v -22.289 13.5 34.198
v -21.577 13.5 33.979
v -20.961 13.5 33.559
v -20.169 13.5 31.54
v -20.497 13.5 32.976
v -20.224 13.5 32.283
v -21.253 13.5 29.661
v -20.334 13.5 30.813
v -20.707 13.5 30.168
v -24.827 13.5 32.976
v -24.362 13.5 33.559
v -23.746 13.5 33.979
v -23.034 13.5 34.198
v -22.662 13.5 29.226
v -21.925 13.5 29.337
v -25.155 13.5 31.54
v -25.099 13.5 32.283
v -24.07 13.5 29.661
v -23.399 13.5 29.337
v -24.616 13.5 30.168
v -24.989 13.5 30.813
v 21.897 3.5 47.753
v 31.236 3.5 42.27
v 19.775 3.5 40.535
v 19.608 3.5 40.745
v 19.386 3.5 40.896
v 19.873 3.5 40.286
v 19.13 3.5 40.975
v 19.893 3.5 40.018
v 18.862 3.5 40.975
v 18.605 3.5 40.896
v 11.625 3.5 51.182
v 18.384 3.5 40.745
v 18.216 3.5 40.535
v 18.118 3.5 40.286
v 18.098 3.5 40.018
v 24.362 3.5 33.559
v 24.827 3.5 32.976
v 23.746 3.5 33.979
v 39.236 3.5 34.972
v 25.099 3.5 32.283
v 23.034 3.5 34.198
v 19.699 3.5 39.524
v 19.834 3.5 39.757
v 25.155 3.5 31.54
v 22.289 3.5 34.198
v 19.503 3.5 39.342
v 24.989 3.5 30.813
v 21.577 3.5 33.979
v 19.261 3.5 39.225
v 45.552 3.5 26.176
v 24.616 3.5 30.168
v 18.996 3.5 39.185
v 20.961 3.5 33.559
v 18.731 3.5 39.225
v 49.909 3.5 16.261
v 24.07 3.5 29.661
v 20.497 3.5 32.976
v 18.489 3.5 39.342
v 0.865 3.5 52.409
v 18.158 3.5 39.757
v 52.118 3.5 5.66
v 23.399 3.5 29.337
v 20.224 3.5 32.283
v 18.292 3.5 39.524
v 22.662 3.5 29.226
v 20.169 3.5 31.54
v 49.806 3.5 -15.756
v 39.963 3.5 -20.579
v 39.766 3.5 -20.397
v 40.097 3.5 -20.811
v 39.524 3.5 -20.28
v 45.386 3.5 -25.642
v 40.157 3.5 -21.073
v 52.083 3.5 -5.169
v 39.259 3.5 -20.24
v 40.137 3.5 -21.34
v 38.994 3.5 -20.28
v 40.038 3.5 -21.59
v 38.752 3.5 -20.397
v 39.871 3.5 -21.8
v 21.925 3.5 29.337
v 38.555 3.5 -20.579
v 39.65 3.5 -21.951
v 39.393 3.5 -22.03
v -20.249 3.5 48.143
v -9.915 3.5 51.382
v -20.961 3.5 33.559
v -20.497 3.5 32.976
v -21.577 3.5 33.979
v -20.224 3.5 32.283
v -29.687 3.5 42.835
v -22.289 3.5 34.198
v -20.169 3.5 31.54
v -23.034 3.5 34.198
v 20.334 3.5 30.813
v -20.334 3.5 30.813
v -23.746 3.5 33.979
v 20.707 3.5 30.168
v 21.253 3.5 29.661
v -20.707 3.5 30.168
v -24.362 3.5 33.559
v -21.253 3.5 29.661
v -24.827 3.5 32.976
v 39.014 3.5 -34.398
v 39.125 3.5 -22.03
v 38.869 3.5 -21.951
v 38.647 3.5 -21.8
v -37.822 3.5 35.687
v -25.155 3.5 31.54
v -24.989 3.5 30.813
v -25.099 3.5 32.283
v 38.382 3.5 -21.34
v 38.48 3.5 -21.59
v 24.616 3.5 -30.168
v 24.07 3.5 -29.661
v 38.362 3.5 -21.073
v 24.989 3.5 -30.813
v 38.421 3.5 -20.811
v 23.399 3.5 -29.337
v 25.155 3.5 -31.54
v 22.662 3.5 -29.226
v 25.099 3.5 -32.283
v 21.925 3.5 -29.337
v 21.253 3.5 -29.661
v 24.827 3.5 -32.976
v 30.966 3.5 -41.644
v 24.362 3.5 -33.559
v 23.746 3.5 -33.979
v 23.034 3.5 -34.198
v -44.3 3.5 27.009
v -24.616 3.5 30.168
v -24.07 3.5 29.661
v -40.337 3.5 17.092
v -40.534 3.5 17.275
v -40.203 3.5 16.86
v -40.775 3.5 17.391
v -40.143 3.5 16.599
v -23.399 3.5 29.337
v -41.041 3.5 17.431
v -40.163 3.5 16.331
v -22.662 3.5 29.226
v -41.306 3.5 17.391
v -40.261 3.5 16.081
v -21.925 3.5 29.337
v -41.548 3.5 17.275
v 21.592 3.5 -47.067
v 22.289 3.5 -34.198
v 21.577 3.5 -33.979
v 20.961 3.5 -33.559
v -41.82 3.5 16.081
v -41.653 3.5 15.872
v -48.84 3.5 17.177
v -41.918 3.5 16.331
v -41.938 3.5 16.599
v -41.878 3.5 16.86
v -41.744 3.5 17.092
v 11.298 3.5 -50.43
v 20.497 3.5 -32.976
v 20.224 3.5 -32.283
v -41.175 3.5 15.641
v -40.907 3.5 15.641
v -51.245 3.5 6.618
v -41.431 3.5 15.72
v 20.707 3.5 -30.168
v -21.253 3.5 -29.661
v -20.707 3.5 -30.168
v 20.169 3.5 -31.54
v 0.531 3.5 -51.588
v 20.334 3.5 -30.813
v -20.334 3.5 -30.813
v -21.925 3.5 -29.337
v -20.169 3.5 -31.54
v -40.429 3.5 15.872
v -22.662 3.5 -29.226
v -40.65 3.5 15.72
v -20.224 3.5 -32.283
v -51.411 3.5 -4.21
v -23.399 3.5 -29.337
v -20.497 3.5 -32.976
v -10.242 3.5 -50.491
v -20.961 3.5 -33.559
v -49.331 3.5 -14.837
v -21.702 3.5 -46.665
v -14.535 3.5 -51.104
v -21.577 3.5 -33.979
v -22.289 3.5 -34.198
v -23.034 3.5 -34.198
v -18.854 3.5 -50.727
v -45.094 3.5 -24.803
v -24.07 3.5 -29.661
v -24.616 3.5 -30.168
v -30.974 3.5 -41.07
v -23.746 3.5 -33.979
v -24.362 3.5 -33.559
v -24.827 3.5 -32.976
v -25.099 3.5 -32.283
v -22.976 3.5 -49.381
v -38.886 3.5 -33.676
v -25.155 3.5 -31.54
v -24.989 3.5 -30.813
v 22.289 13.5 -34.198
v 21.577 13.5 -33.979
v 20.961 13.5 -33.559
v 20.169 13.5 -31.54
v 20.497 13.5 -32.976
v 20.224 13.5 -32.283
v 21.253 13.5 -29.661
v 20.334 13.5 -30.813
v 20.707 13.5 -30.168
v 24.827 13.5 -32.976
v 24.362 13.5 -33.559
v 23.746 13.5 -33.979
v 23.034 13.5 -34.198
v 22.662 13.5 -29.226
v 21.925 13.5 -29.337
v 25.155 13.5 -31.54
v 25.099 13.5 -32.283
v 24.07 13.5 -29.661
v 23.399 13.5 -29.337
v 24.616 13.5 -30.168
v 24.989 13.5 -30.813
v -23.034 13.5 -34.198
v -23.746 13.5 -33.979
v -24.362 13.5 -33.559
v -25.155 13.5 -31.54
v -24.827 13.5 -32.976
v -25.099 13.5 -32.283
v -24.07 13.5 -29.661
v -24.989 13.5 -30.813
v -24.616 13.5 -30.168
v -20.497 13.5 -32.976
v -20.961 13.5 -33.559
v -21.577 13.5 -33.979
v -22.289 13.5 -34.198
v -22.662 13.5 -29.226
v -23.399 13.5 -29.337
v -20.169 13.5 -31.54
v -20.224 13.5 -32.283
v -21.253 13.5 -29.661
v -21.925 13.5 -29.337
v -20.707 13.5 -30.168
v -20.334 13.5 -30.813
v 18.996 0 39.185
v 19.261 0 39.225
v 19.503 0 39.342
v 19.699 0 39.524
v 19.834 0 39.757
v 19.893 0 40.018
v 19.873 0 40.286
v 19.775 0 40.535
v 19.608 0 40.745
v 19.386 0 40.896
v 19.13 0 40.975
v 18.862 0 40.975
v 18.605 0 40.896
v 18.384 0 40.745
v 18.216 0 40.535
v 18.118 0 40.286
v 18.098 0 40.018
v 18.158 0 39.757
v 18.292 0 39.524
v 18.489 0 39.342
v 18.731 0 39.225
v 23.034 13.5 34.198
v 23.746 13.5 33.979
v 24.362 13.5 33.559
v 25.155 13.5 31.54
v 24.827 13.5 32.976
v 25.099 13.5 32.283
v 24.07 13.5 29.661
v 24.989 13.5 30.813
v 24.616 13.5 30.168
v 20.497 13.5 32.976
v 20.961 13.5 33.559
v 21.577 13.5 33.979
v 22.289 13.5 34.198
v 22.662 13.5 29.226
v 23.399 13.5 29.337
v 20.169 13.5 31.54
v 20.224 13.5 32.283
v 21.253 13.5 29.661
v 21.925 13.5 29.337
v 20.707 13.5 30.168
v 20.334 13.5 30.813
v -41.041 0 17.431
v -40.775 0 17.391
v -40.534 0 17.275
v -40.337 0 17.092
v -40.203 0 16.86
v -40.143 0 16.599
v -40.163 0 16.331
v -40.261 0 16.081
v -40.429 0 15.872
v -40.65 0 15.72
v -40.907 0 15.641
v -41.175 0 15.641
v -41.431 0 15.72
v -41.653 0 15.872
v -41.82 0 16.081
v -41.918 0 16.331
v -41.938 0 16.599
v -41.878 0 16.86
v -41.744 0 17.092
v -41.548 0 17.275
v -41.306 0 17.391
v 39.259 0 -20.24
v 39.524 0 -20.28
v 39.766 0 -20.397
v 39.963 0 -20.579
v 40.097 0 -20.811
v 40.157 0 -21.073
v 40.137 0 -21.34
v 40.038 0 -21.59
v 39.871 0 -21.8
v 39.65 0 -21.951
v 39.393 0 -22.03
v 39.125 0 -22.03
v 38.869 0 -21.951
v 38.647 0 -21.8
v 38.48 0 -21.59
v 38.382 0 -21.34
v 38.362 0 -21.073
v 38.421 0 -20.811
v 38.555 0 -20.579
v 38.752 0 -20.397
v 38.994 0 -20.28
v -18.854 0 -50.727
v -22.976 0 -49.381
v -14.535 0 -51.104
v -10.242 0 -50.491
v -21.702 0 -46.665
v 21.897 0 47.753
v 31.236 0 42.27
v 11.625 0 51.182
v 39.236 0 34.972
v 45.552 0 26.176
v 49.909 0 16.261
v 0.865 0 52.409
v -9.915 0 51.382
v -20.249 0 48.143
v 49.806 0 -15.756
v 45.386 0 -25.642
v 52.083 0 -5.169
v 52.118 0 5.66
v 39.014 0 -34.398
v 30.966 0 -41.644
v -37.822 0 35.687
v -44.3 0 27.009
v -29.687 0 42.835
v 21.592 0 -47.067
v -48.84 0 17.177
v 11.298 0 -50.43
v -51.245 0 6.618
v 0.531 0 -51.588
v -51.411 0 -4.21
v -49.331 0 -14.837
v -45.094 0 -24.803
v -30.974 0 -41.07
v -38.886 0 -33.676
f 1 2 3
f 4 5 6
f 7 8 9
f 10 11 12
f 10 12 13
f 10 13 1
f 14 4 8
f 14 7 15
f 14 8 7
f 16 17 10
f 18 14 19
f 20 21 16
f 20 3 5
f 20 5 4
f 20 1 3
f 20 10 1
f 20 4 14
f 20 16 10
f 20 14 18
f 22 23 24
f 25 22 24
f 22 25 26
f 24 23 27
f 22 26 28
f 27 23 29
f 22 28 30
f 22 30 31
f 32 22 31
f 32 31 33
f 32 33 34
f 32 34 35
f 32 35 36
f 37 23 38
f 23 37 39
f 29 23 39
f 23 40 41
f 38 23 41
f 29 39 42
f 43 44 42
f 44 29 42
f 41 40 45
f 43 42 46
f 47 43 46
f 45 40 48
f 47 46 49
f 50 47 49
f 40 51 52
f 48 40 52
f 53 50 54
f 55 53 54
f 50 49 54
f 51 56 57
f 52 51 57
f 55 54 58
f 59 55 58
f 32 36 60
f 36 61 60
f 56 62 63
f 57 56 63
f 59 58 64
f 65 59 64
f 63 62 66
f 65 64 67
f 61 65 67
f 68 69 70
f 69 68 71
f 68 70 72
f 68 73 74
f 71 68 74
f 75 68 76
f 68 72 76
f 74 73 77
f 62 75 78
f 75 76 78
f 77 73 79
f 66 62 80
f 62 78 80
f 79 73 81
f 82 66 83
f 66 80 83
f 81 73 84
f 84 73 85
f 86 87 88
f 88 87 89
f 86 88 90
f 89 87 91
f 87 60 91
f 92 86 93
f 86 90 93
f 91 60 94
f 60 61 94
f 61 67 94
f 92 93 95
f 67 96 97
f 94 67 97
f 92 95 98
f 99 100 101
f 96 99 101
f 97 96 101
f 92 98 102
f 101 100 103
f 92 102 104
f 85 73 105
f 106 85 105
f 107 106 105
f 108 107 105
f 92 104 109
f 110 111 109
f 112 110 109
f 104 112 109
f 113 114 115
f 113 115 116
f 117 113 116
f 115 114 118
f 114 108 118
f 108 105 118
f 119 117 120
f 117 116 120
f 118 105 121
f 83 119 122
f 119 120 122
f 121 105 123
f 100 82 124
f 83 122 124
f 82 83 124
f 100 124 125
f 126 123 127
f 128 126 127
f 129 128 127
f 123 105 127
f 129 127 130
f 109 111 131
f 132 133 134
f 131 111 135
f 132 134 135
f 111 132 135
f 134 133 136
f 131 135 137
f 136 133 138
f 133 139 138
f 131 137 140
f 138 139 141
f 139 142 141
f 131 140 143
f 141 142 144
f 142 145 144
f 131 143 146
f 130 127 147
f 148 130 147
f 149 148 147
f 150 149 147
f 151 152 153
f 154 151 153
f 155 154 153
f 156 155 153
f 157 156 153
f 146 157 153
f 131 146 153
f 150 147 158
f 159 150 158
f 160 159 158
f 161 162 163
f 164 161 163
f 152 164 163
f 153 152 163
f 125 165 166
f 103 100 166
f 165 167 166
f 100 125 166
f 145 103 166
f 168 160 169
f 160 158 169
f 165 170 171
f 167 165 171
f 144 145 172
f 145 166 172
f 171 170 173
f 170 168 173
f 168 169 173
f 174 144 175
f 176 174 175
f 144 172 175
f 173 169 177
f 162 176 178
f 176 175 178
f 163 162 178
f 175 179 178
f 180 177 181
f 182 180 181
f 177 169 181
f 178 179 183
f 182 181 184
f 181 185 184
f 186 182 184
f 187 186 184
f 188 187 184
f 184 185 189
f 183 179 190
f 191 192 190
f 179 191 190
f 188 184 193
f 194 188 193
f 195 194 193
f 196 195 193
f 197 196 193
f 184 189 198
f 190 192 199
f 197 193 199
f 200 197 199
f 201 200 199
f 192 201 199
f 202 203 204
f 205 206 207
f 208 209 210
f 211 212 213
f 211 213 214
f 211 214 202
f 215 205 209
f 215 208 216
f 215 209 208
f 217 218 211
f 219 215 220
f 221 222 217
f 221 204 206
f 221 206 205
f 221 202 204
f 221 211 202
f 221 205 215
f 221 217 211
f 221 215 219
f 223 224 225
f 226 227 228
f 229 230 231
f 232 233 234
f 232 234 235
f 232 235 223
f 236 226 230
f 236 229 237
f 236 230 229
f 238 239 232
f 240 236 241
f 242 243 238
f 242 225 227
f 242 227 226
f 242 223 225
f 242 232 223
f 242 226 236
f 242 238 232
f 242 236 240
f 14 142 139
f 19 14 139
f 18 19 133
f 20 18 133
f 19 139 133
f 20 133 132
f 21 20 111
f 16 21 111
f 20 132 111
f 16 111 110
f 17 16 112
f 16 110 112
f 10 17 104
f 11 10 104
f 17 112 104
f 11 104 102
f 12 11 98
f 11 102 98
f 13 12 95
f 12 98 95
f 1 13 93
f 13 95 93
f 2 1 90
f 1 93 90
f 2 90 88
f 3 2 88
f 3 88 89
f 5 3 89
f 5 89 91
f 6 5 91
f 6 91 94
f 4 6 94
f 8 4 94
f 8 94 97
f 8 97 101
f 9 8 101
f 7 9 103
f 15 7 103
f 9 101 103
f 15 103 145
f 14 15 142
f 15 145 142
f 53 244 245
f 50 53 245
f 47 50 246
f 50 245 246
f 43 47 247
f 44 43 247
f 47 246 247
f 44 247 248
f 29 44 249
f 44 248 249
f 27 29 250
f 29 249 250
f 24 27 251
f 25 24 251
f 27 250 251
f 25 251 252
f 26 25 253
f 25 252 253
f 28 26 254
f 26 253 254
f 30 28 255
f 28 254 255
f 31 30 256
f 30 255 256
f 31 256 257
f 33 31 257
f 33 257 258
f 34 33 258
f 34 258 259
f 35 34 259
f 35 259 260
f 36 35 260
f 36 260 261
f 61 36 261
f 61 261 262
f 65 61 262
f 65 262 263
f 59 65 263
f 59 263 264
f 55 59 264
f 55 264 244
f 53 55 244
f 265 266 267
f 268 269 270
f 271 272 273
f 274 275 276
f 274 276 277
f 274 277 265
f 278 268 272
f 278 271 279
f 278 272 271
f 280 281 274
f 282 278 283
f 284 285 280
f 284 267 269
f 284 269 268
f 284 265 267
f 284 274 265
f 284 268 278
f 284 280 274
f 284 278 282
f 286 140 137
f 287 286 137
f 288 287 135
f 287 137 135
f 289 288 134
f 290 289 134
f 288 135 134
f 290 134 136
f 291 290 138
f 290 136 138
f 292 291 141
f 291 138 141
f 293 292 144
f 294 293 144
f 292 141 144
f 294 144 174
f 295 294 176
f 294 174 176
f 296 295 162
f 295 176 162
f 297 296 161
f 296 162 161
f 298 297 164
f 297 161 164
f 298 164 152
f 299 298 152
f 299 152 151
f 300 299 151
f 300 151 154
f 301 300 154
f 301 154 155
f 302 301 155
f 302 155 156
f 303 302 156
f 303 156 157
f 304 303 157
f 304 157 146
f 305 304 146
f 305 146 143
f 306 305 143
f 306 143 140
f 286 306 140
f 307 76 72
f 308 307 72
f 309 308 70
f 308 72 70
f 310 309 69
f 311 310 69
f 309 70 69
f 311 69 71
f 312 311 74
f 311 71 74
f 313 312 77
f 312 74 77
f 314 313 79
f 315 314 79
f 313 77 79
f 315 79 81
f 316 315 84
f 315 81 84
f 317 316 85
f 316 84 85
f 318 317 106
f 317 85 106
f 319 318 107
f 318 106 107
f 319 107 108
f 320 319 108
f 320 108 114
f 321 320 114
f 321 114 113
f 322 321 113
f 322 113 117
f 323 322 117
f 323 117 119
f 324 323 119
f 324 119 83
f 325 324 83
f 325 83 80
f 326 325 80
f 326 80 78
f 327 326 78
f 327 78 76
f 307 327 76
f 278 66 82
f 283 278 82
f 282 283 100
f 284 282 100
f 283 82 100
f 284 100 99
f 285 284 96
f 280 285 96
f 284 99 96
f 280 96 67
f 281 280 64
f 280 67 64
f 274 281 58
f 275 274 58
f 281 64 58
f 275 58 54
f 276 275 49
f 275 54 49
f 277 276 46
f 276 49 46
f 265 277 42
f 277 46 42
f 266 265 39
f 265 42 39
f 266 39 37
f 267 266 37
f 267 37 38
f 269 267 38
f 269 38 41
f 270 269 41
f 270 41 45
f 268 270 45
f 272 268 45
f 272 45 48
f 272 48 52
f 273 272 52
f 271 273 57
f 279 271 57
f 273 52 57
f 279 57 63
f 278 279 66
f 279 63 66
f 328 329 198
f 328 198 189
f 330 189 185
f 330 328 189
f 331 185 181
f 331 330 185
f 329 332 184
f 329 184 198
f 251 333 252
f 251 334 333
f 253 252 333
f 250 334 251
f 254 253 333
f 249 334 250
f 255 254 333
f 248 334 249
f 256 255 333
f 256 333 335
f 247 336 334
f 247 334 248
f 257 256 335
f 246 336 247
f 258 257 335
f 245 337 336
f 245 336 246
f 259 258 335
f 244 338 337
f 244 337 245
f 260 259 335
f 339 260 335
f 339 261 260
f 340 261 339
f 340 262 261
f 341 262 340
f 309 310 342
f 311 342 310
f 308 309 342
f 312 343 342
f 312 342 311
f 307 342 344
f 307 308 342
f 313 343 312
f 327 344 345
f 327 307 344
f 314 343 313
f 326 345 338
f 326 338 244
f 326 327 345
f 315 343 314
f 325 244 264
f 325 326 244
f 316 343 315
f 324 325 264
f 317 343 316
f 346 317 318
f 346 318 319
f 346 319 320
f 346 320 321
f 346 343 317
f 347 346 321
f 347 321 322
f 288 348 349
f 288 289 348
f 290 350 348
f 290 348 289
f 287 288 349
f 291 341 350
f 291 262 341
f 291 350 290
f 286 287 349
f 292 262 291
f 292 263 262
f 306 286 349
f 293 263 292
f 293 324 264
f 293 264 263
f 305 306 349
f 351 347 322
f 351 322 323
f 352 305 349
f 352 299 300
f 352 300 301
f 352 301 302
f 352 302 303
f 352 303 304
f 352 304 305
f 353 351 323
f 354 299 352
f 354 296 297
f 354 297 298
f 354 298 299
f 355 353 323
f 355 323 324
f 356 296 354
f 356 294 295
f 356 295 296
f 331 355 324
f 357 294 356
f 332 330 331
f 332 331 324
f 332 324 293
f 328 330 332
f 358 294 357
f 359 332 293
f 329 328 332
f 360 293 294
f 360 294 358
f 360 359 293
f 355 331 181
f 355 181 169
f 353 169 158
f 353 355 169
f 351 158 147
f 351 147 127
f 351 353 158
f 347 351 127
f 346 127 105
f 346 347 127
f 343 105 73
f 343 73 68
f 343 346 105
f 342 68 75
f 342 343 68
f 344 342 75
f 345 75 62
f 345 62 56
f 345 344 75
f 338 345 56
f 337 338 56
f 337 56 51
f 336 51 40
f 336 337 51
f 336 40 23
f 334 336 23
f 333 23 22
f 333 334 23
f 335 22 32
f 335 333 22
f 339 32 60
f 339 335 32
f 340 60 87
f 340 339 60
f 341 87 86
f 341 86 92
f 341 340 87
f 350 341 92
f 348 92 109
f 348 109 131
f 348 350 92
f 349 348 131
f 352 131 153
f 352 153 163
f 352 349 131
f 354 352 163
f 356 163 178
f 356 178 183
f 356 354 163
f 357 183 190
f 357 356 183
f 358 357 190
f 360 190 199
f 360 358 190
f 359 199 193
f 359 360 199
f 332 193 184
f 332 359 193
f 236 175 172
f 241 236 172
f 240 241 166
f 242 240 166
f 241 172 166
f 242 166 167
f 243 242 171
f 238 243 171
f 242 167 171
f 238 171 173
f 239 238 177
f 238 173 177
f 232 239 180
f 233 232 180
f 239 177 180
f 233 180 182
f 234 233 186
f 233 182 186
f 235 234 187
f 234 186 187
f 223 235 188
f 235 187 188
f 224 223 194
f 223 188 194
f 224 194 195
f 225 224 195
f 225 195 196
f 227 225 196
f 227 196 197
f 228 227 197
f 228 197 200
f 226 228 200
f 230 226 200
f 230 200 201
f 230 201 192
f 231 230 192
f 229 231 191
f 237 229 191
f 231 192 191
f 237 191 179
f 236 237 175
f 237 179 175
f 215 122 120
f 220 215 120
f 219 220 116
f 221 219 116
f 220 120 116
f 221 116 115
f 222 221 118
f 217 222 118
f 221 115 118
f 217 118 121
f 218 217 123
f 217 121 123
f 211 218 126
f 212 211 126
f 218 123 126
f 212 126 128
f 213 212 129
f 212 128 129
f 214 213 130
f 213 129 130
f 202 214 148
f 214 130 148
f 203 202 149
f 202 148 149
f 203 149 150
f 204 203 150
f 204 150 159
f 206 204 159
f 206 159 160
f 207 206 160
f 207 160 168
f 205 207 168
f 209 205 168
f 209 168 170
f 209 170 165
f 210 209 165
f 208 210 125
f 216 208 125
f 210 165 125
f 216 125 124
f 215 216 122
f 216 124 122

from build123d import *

# Parameters (mm, degrees)
BOSS_EXTRUDE1_DEPTH = 3.5
SKETCH2_R           = 0.9
CUT_EXTRUDE1_DEPTH  = 75.183799012
SKETCH3_R           = 2.5
BOSS_EXTRUDE2_DEPTH = 10
SKETCH4_R           = 0.9
CUT_EXTRUDE2_DEPTH  = 10


with BuildPart() as part:
    # Sketch1 → Boss-Extrude1 (new body)
    with BuildSketch(Plane(origin=(0, 0, 0), x_dir=(1, 0, 0), z_dir=(0, 1, 0))):
        with BuildLine():
            Line((-21.702078291, 46.665350003), (-22.976238483, 49.381324194))
            ThreePointArc((-22.976238483, 49.381324194), (-16.705296787, 51.039340816), (-10.242062523, 50.491315514))
            ThreePointArc((-10.242062523, 50.491315514), (16.850294685, -49.735366194), (-21.702078291, 46.665350003))
        make_face()
    extrude(amount=BOSS_EXTRUDE1_DEPTH)

    # Sketch2 → Cut-Extrude1 (cut, through all)
    with BuildSketch(Plane(origin=(0, 3.5, 0), x_dir=(1, 0, 0), z_dir=(0, 1, 0))):
        with Locations(Location((-41.040664553, -16.531295011, 0), (0, 0, 270))):
            Circle(SKETCH2_R)
        with Locations(Location((39.259074256, 21.140171457, 0), (0, 0, 270))):
            Circle(SKETCH2_R)
    extrude(amount=-CUT_EXTRUDE1_DEPTH, mode=Mode.SUBTRACT)

    # Sketch3 → Boss-Extrude2 (add)
    with BuildSketch(Plane(origin=(0, 3.5, 0), x_dir=(1, 0, 0), z_dir=(0, 1, 0))):
        with Locations(Location((-22.661676127, 31.726346577, 0), (0, 0, 270))):
            Circle(SKETCH3_R)
        with Locations(Location((22.661676127, 31.726346577, 0), (0, 0, 270))):
            Circle(SKETCH3_R)
        with Locations(Location((22.661676127, -31.726346577, 0), (0, 0, 90))):
            Circle(SKETCH3_R)
        with Locations(Location((-22.661676127, -31.726346577, 0), (0, 0, 90))):
            Circle(SKETCH3_R)
    extrude(amount=BOSS_EXTRUDE2_DEPTH)

    # Sketch4 → Cut-Extrude2 (cut)
    with BuildSketch(Plane.XZ):
        with Locations(Location((18.995826683, 40.085484141, 0), (0, 0, 270))):
            Circle(SKETCH4_R)
    extrude(amount=-CUT_EXTRUDE2_DEPTH, mode=Mode.SUBTRACT)


solid = part.part
